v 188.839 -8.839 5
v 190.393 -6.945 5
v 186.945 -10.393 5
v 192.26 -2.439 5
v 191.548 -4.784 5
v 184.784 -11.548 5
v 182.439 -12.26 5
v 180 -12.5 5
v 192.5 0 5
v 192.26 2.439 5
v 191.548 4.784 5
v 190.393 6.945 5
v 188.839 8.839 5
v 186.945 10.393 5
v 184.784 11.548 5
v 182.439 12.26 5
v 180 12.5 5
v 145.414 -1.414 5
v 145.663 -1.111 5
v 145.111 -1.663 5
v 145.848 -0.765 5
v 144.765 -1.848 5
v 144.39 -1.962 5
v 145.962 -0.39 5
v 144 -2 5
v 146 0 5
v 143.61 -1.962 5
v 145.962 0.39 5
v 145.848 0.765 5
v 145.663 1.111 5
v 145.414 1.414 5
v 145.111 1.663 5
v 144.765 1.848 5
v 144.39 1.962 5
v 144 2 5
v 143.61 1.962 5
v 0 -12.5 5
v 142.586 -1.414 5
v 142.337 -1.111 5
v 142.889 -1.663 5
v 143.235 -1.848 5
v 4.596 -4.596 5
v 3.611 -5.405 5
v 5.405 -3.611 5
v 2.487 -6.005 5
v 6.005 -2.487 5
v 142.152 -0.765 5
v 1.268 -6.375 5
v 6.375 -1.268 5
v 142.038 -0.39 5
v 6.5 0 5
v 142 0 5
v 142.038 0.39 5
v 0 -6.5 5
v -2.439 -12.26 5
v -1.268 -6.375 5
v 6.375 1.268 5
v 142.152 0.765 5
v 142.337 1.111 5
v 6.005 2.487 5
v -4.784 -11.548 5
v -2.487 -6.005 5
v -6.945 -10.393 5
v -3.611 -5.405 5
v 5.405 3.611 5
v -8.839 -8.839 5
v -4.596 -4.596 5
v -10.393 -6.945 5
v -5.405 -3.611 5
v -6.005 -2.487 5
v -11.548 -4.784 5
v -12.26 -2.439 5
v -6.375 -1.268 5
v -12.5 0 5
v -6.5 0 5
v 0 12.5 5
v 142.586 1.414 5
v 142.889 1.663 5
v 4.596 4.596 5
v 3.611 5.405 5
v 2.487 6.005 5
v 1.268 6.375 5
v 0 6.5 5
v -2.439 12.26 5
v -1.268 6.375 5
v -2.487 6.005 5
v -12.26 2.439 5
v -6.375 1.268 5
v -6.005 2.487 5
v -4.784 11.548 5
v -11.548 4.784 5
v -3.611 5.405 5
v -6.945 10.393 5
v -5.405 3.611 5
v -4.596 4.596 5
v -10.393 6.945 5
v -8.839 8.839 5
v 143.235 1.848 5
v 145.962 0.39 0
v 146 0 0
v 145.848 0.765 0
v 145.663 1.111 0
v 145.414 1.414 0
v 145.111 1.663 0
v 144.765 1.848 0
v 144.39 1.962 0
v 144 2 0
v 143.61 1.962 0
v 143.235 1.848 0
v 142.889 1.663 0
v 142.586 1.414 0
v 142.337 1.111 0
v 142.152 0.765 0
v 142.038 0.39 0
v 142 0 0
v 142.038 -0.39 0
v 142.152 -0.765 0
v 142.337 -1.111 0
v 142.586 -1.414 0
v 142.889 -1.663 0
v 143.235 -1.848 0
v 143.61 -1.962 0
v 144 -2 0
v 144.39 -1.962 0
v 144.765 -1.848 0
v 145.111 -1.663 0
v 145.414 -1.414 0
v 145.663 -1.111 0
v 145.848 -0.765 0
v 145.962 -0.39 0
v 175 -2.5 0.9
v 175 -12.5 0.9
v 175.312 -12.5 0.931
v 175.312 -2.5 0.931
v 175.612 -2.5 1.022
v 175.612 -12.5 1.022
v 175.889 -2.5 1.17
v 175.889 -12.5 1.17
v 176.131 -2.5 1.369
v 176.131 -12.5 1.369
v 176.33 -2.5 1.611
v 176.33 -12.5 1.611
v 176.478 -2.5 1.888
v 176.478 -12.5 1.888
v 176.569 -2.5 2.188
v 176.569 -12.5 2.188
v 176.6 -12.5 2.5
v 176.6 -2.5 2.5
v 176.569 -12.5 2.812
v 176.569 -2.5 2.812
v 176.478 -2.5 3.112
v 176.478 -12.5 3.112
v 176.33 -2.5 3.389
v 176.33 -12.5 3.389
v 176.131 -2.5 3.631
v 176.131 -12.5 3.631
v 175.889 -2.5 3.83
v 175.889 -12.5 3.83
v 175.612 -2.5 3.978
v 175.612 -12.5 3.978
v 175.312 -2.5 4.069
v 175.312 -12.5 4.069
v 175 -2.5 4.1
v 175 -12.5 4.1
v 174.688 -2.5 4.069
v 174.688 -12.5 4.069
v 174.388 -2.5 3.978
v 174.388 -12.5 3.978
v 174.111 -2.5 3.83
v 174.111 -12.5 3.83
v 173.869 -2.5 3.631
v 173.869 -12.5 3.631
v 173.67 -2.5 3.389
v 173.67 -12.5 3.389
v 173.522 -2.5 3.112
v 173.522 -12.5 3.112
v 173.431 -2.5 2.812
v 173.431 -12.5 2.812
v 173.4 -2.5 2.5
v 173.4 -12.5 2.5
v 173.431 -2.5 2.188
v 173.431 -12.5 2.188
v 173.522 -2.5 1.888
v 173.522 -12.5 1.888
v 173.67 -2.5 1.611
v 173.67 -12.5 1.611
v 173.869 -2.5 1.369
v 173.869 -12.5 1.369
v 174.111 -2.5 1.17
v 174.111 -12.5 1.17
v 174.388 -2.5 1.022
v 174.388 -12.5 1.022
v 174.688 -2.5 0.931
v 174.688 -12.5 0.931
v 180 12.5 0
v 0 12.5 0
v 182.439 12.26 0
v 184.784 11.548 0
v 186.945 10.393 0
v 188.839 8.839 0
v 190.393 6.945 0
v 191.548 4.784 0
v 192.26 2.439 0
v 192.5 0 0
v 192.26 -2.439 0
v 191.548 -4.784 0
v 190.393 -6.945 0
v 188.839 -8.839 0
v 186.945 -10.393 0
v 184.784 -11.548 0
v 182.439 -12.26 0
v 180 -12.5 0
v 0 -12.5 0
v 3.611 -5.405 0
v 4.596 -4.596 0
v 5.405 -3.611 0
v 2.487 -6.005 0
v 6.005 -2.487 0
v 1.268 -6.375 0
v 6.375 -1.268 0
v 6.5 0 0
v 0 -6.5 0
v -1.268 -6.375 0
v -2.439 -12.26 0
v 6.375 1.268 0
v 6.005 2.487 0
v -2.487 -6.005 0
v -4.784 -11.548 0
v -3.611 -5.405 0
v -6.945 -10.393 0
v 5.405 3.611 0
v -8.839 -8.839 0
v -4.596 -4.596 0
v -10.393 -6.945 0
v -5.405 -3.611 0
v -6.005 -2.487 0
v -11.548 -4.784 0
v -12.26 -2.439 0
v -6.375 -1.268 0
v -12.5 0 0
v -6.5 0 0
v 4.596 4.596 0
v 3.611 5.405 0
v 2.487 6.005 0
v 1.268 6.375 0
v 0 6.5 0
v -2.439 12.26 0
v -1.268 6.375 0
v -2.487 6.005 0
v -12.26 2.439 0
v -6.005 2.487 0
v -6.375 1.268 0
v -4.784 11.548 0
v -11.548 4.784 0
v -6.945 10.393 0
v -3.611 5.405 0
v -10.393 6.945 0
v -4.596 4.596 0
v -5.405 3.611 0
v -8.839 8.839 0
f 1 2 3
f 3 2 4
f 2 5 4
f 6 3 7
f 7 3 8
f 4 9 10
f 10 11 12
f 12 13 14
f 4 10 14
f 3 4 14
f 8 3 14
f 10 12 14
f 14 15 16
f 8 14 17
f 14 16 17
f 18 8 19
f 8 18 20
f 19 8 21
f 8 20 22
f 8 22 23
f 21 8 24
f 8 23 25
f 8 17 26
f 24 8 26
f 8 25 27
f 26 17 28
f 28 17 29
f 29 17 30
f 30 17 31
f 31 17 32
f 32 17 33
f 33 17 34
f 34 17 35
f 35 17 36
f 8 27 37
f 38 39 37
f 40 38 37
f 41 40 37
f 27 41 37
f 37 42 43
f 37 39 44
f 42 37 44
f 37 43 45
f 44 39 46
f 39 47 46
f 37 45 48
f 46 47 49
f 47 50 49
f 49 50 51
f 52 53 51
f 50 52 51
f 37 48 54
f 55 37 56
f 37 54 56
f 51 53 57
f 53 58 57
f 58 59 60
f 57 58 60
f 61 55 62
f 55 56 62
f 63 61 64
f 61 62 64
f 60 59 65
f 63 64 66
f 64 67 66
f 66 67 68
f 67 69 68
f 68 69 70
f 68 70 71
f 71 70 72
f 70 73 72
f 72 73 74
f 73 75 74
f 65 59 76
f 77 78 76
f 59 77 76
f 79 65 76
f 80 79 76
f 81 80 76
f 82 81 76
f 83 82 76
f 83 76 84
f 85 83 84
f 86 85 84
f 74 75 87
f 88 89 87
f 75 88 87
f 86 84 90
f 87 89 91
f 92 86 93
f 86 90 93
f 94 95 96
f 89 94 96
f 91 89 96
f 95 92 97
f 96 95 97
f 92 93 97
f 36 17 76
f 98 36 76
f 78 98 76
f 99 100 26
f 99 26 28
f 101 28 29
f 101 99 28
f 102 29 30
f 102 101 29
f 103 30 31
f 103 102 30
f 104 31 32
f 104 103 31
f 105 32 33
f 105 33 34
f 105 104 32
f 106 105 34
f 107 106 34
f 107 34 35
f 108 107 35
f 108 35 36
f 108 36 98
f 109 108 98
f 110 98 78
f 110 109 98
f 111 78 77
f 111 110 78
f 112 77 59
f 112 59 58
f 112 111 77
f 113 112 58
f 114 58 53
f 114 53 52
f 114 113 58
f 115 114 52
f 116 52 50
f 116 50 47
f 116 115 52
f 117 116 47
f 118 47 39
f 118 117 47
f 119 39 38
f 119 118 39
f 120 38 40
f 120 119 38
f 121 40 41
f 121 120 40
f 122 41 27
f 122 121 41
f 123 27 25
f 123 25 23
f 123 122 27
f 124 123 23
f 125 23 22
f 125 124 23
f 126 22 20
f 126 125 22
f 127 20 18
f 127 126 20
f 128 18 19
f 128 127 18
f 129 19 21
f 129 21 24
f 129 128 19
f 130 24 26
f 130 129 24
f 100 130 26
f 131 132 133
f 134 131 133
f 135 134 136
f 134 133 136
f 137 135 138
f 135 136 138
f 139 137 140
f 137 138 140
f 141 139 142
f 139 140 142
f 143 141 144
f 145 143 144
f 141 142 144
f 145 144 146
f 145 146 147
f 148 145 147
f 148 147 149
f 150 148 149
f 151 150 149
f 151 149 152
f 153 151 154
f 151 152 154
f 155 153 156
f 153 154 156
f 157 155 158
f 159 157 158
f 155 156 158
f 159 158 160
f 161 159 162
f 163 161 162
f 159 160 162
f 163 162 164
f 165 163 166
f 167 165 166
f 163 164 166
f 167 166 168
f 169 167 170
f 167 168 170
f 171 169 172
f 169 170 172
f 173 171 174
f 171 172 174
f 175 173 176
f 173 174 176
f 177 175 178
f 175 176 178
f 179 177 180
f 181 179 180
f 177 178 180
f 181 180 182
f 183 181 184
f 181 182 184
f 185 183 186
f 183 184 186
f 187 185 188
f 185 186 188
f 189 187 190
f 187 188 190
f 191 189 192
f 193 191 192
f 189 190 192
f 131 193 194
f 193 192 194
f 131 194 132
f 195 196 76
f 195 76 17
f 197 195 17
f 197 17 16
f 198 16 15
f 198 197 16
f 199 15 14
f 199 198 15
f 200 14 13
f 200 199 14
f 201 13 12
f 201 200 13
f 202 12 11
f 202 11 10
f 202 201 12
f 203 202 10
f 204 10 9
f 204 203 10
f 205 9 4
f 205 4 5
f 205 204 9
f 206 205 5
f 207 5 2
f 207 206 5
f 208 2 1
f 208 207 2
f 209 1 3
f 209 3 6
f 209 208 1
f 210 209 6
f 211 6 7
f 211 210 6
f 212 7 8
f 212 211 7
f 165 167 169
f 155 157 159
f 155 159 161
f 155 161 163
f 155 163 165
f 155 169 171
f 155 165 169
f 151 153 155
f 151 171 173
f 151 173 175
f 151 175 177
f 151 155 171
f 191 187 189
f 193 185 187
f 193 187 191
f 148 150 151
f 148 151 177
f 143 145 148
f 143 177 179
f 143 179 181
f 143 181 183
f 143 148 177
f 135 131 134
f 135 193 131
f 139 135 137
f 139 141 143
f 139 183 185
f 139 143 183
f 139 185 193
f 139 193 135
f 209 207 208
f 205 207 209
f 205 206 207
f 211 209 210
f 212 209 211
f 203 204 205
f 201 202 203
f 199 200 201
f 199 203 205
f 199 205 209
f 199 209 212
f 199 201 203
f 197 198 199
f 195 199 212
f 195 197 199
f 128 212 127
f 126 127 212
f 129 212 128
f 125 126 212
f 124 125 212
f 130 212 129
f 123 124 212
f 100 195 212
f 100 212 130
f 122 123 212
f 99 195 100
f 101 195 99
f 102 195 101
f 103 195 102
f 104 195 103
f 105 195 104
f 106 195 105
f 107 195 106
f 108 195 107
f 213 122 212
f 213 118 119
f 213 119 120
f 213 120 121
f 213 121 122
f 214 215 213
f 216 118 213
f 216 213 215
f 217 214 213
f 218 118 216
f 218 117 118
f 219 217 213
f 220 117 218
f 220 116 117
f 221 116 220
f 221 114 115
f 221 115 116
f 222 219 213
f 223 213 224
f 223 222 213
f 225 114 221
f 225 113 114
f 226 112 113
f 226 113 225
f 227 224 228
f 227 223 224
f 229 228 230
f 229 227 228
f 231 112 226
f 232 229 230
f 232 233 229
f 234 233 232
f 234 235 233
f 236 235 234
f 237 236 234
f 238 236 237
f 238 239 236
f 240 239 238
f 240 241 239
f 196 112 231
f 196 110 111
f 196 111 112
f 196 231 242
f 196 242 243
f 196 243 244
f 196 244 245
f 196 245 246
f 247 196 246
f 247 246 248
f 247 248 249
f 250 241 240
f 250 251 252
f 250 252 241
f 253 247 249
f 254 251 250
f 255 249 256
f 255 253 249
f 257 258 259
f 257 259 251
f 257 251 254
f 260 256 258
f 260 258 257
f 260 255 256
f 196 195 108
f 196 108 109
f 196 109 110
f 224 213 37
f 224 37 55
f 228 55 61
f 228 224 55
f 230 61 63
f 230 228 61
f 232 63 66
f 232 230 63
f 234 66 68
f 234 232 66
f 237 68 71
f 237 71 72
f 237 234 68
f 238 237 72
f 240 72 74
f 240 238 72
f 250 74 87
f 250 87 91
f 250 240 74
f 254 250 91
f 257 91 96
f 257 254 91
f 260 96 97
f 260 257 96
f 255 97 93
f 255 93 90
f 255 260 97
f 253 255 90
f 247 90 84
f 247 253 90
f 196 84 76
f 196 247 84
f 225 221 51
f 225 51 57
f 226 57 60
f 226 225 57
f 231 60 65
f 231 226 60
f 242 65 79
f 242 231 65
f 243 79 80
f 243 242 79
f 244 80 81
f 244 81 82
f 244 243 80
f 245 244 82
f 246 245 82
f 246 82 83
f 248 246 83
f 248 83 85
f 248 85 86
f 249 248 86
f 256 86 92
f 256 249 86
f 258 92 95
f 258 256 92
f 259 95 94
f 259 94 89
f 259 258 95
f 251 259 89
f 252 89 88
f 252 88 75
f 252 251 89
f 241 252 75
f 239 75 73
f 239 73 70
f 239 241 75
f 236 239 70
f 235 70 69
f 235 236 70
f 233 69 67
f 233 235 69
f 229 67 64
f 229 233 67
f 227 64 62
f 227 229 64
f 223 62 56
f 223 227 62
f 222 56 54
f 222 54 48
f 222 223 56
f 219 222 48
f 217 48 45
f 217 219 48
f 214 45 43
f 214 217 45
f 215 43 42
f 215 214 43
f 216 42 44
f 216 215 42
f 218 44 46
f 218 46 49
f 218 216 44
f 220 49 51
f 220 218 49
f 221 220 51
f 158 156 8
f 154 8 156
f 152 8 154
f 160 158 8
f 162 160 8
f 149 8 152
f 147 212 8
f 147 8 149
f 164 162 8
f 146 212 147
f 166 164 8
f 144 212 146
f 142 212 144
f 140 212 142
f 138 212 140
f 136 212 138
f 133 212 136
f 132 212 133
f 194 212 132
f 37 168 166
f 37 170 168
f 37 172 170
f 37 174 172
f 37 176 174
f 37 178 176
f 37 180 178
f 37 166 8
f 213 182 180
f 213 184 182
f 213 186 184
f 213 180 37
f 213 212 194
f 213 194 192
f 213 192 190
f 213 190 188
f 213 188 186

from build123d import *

# Parameters (mm, degrees)
SKETCH1_R           = 6.5
SKETCH1_R_2         = 2
BOSS_EXTRUDE1_DEPTH = 5
SKETCH2_R           = 1.6
CUT_EXTRUDE1_DEPTH  = 10


with BuildPart() as part:
    # Sketch1 → Boss-Extrude1 (new body)
    with BuildSketch(Plane.XY):
        with BuildLine():
            Line((0, 12.5), (180, 12.5))
            ThreePointArc((180, 12.5), (192.5, 0), (180, -12.5))
            Line((180, -12.5), (0, -12.5))
            ThreePointArc((0, -12.5), (-12.5, 0), (0, 12.5))
        make_face()
        Circle(SKETCH1_R, mode=Mode.SUBTRACT)
        with Locations((144, 0)):
            Circle(SKETCH1_R_2, mode=Mode.SUBTRACT)
    extrude(amount=BOSS_EXTRUDE1_DEPTH)

    # Sketch2 → Cut-Extrude1 (cut)
    with BuildSketch(Plane.XZ.offset(12.5)):
        with Locations(Location((175, 2.5, 0), (0, 0, 270))):
            Circle(SKETCH2_R)
    extrude(amount=-CUT_EXTRUDE1_DEPTH, mode=Mode.SUBTRACT)


solid = part.part
